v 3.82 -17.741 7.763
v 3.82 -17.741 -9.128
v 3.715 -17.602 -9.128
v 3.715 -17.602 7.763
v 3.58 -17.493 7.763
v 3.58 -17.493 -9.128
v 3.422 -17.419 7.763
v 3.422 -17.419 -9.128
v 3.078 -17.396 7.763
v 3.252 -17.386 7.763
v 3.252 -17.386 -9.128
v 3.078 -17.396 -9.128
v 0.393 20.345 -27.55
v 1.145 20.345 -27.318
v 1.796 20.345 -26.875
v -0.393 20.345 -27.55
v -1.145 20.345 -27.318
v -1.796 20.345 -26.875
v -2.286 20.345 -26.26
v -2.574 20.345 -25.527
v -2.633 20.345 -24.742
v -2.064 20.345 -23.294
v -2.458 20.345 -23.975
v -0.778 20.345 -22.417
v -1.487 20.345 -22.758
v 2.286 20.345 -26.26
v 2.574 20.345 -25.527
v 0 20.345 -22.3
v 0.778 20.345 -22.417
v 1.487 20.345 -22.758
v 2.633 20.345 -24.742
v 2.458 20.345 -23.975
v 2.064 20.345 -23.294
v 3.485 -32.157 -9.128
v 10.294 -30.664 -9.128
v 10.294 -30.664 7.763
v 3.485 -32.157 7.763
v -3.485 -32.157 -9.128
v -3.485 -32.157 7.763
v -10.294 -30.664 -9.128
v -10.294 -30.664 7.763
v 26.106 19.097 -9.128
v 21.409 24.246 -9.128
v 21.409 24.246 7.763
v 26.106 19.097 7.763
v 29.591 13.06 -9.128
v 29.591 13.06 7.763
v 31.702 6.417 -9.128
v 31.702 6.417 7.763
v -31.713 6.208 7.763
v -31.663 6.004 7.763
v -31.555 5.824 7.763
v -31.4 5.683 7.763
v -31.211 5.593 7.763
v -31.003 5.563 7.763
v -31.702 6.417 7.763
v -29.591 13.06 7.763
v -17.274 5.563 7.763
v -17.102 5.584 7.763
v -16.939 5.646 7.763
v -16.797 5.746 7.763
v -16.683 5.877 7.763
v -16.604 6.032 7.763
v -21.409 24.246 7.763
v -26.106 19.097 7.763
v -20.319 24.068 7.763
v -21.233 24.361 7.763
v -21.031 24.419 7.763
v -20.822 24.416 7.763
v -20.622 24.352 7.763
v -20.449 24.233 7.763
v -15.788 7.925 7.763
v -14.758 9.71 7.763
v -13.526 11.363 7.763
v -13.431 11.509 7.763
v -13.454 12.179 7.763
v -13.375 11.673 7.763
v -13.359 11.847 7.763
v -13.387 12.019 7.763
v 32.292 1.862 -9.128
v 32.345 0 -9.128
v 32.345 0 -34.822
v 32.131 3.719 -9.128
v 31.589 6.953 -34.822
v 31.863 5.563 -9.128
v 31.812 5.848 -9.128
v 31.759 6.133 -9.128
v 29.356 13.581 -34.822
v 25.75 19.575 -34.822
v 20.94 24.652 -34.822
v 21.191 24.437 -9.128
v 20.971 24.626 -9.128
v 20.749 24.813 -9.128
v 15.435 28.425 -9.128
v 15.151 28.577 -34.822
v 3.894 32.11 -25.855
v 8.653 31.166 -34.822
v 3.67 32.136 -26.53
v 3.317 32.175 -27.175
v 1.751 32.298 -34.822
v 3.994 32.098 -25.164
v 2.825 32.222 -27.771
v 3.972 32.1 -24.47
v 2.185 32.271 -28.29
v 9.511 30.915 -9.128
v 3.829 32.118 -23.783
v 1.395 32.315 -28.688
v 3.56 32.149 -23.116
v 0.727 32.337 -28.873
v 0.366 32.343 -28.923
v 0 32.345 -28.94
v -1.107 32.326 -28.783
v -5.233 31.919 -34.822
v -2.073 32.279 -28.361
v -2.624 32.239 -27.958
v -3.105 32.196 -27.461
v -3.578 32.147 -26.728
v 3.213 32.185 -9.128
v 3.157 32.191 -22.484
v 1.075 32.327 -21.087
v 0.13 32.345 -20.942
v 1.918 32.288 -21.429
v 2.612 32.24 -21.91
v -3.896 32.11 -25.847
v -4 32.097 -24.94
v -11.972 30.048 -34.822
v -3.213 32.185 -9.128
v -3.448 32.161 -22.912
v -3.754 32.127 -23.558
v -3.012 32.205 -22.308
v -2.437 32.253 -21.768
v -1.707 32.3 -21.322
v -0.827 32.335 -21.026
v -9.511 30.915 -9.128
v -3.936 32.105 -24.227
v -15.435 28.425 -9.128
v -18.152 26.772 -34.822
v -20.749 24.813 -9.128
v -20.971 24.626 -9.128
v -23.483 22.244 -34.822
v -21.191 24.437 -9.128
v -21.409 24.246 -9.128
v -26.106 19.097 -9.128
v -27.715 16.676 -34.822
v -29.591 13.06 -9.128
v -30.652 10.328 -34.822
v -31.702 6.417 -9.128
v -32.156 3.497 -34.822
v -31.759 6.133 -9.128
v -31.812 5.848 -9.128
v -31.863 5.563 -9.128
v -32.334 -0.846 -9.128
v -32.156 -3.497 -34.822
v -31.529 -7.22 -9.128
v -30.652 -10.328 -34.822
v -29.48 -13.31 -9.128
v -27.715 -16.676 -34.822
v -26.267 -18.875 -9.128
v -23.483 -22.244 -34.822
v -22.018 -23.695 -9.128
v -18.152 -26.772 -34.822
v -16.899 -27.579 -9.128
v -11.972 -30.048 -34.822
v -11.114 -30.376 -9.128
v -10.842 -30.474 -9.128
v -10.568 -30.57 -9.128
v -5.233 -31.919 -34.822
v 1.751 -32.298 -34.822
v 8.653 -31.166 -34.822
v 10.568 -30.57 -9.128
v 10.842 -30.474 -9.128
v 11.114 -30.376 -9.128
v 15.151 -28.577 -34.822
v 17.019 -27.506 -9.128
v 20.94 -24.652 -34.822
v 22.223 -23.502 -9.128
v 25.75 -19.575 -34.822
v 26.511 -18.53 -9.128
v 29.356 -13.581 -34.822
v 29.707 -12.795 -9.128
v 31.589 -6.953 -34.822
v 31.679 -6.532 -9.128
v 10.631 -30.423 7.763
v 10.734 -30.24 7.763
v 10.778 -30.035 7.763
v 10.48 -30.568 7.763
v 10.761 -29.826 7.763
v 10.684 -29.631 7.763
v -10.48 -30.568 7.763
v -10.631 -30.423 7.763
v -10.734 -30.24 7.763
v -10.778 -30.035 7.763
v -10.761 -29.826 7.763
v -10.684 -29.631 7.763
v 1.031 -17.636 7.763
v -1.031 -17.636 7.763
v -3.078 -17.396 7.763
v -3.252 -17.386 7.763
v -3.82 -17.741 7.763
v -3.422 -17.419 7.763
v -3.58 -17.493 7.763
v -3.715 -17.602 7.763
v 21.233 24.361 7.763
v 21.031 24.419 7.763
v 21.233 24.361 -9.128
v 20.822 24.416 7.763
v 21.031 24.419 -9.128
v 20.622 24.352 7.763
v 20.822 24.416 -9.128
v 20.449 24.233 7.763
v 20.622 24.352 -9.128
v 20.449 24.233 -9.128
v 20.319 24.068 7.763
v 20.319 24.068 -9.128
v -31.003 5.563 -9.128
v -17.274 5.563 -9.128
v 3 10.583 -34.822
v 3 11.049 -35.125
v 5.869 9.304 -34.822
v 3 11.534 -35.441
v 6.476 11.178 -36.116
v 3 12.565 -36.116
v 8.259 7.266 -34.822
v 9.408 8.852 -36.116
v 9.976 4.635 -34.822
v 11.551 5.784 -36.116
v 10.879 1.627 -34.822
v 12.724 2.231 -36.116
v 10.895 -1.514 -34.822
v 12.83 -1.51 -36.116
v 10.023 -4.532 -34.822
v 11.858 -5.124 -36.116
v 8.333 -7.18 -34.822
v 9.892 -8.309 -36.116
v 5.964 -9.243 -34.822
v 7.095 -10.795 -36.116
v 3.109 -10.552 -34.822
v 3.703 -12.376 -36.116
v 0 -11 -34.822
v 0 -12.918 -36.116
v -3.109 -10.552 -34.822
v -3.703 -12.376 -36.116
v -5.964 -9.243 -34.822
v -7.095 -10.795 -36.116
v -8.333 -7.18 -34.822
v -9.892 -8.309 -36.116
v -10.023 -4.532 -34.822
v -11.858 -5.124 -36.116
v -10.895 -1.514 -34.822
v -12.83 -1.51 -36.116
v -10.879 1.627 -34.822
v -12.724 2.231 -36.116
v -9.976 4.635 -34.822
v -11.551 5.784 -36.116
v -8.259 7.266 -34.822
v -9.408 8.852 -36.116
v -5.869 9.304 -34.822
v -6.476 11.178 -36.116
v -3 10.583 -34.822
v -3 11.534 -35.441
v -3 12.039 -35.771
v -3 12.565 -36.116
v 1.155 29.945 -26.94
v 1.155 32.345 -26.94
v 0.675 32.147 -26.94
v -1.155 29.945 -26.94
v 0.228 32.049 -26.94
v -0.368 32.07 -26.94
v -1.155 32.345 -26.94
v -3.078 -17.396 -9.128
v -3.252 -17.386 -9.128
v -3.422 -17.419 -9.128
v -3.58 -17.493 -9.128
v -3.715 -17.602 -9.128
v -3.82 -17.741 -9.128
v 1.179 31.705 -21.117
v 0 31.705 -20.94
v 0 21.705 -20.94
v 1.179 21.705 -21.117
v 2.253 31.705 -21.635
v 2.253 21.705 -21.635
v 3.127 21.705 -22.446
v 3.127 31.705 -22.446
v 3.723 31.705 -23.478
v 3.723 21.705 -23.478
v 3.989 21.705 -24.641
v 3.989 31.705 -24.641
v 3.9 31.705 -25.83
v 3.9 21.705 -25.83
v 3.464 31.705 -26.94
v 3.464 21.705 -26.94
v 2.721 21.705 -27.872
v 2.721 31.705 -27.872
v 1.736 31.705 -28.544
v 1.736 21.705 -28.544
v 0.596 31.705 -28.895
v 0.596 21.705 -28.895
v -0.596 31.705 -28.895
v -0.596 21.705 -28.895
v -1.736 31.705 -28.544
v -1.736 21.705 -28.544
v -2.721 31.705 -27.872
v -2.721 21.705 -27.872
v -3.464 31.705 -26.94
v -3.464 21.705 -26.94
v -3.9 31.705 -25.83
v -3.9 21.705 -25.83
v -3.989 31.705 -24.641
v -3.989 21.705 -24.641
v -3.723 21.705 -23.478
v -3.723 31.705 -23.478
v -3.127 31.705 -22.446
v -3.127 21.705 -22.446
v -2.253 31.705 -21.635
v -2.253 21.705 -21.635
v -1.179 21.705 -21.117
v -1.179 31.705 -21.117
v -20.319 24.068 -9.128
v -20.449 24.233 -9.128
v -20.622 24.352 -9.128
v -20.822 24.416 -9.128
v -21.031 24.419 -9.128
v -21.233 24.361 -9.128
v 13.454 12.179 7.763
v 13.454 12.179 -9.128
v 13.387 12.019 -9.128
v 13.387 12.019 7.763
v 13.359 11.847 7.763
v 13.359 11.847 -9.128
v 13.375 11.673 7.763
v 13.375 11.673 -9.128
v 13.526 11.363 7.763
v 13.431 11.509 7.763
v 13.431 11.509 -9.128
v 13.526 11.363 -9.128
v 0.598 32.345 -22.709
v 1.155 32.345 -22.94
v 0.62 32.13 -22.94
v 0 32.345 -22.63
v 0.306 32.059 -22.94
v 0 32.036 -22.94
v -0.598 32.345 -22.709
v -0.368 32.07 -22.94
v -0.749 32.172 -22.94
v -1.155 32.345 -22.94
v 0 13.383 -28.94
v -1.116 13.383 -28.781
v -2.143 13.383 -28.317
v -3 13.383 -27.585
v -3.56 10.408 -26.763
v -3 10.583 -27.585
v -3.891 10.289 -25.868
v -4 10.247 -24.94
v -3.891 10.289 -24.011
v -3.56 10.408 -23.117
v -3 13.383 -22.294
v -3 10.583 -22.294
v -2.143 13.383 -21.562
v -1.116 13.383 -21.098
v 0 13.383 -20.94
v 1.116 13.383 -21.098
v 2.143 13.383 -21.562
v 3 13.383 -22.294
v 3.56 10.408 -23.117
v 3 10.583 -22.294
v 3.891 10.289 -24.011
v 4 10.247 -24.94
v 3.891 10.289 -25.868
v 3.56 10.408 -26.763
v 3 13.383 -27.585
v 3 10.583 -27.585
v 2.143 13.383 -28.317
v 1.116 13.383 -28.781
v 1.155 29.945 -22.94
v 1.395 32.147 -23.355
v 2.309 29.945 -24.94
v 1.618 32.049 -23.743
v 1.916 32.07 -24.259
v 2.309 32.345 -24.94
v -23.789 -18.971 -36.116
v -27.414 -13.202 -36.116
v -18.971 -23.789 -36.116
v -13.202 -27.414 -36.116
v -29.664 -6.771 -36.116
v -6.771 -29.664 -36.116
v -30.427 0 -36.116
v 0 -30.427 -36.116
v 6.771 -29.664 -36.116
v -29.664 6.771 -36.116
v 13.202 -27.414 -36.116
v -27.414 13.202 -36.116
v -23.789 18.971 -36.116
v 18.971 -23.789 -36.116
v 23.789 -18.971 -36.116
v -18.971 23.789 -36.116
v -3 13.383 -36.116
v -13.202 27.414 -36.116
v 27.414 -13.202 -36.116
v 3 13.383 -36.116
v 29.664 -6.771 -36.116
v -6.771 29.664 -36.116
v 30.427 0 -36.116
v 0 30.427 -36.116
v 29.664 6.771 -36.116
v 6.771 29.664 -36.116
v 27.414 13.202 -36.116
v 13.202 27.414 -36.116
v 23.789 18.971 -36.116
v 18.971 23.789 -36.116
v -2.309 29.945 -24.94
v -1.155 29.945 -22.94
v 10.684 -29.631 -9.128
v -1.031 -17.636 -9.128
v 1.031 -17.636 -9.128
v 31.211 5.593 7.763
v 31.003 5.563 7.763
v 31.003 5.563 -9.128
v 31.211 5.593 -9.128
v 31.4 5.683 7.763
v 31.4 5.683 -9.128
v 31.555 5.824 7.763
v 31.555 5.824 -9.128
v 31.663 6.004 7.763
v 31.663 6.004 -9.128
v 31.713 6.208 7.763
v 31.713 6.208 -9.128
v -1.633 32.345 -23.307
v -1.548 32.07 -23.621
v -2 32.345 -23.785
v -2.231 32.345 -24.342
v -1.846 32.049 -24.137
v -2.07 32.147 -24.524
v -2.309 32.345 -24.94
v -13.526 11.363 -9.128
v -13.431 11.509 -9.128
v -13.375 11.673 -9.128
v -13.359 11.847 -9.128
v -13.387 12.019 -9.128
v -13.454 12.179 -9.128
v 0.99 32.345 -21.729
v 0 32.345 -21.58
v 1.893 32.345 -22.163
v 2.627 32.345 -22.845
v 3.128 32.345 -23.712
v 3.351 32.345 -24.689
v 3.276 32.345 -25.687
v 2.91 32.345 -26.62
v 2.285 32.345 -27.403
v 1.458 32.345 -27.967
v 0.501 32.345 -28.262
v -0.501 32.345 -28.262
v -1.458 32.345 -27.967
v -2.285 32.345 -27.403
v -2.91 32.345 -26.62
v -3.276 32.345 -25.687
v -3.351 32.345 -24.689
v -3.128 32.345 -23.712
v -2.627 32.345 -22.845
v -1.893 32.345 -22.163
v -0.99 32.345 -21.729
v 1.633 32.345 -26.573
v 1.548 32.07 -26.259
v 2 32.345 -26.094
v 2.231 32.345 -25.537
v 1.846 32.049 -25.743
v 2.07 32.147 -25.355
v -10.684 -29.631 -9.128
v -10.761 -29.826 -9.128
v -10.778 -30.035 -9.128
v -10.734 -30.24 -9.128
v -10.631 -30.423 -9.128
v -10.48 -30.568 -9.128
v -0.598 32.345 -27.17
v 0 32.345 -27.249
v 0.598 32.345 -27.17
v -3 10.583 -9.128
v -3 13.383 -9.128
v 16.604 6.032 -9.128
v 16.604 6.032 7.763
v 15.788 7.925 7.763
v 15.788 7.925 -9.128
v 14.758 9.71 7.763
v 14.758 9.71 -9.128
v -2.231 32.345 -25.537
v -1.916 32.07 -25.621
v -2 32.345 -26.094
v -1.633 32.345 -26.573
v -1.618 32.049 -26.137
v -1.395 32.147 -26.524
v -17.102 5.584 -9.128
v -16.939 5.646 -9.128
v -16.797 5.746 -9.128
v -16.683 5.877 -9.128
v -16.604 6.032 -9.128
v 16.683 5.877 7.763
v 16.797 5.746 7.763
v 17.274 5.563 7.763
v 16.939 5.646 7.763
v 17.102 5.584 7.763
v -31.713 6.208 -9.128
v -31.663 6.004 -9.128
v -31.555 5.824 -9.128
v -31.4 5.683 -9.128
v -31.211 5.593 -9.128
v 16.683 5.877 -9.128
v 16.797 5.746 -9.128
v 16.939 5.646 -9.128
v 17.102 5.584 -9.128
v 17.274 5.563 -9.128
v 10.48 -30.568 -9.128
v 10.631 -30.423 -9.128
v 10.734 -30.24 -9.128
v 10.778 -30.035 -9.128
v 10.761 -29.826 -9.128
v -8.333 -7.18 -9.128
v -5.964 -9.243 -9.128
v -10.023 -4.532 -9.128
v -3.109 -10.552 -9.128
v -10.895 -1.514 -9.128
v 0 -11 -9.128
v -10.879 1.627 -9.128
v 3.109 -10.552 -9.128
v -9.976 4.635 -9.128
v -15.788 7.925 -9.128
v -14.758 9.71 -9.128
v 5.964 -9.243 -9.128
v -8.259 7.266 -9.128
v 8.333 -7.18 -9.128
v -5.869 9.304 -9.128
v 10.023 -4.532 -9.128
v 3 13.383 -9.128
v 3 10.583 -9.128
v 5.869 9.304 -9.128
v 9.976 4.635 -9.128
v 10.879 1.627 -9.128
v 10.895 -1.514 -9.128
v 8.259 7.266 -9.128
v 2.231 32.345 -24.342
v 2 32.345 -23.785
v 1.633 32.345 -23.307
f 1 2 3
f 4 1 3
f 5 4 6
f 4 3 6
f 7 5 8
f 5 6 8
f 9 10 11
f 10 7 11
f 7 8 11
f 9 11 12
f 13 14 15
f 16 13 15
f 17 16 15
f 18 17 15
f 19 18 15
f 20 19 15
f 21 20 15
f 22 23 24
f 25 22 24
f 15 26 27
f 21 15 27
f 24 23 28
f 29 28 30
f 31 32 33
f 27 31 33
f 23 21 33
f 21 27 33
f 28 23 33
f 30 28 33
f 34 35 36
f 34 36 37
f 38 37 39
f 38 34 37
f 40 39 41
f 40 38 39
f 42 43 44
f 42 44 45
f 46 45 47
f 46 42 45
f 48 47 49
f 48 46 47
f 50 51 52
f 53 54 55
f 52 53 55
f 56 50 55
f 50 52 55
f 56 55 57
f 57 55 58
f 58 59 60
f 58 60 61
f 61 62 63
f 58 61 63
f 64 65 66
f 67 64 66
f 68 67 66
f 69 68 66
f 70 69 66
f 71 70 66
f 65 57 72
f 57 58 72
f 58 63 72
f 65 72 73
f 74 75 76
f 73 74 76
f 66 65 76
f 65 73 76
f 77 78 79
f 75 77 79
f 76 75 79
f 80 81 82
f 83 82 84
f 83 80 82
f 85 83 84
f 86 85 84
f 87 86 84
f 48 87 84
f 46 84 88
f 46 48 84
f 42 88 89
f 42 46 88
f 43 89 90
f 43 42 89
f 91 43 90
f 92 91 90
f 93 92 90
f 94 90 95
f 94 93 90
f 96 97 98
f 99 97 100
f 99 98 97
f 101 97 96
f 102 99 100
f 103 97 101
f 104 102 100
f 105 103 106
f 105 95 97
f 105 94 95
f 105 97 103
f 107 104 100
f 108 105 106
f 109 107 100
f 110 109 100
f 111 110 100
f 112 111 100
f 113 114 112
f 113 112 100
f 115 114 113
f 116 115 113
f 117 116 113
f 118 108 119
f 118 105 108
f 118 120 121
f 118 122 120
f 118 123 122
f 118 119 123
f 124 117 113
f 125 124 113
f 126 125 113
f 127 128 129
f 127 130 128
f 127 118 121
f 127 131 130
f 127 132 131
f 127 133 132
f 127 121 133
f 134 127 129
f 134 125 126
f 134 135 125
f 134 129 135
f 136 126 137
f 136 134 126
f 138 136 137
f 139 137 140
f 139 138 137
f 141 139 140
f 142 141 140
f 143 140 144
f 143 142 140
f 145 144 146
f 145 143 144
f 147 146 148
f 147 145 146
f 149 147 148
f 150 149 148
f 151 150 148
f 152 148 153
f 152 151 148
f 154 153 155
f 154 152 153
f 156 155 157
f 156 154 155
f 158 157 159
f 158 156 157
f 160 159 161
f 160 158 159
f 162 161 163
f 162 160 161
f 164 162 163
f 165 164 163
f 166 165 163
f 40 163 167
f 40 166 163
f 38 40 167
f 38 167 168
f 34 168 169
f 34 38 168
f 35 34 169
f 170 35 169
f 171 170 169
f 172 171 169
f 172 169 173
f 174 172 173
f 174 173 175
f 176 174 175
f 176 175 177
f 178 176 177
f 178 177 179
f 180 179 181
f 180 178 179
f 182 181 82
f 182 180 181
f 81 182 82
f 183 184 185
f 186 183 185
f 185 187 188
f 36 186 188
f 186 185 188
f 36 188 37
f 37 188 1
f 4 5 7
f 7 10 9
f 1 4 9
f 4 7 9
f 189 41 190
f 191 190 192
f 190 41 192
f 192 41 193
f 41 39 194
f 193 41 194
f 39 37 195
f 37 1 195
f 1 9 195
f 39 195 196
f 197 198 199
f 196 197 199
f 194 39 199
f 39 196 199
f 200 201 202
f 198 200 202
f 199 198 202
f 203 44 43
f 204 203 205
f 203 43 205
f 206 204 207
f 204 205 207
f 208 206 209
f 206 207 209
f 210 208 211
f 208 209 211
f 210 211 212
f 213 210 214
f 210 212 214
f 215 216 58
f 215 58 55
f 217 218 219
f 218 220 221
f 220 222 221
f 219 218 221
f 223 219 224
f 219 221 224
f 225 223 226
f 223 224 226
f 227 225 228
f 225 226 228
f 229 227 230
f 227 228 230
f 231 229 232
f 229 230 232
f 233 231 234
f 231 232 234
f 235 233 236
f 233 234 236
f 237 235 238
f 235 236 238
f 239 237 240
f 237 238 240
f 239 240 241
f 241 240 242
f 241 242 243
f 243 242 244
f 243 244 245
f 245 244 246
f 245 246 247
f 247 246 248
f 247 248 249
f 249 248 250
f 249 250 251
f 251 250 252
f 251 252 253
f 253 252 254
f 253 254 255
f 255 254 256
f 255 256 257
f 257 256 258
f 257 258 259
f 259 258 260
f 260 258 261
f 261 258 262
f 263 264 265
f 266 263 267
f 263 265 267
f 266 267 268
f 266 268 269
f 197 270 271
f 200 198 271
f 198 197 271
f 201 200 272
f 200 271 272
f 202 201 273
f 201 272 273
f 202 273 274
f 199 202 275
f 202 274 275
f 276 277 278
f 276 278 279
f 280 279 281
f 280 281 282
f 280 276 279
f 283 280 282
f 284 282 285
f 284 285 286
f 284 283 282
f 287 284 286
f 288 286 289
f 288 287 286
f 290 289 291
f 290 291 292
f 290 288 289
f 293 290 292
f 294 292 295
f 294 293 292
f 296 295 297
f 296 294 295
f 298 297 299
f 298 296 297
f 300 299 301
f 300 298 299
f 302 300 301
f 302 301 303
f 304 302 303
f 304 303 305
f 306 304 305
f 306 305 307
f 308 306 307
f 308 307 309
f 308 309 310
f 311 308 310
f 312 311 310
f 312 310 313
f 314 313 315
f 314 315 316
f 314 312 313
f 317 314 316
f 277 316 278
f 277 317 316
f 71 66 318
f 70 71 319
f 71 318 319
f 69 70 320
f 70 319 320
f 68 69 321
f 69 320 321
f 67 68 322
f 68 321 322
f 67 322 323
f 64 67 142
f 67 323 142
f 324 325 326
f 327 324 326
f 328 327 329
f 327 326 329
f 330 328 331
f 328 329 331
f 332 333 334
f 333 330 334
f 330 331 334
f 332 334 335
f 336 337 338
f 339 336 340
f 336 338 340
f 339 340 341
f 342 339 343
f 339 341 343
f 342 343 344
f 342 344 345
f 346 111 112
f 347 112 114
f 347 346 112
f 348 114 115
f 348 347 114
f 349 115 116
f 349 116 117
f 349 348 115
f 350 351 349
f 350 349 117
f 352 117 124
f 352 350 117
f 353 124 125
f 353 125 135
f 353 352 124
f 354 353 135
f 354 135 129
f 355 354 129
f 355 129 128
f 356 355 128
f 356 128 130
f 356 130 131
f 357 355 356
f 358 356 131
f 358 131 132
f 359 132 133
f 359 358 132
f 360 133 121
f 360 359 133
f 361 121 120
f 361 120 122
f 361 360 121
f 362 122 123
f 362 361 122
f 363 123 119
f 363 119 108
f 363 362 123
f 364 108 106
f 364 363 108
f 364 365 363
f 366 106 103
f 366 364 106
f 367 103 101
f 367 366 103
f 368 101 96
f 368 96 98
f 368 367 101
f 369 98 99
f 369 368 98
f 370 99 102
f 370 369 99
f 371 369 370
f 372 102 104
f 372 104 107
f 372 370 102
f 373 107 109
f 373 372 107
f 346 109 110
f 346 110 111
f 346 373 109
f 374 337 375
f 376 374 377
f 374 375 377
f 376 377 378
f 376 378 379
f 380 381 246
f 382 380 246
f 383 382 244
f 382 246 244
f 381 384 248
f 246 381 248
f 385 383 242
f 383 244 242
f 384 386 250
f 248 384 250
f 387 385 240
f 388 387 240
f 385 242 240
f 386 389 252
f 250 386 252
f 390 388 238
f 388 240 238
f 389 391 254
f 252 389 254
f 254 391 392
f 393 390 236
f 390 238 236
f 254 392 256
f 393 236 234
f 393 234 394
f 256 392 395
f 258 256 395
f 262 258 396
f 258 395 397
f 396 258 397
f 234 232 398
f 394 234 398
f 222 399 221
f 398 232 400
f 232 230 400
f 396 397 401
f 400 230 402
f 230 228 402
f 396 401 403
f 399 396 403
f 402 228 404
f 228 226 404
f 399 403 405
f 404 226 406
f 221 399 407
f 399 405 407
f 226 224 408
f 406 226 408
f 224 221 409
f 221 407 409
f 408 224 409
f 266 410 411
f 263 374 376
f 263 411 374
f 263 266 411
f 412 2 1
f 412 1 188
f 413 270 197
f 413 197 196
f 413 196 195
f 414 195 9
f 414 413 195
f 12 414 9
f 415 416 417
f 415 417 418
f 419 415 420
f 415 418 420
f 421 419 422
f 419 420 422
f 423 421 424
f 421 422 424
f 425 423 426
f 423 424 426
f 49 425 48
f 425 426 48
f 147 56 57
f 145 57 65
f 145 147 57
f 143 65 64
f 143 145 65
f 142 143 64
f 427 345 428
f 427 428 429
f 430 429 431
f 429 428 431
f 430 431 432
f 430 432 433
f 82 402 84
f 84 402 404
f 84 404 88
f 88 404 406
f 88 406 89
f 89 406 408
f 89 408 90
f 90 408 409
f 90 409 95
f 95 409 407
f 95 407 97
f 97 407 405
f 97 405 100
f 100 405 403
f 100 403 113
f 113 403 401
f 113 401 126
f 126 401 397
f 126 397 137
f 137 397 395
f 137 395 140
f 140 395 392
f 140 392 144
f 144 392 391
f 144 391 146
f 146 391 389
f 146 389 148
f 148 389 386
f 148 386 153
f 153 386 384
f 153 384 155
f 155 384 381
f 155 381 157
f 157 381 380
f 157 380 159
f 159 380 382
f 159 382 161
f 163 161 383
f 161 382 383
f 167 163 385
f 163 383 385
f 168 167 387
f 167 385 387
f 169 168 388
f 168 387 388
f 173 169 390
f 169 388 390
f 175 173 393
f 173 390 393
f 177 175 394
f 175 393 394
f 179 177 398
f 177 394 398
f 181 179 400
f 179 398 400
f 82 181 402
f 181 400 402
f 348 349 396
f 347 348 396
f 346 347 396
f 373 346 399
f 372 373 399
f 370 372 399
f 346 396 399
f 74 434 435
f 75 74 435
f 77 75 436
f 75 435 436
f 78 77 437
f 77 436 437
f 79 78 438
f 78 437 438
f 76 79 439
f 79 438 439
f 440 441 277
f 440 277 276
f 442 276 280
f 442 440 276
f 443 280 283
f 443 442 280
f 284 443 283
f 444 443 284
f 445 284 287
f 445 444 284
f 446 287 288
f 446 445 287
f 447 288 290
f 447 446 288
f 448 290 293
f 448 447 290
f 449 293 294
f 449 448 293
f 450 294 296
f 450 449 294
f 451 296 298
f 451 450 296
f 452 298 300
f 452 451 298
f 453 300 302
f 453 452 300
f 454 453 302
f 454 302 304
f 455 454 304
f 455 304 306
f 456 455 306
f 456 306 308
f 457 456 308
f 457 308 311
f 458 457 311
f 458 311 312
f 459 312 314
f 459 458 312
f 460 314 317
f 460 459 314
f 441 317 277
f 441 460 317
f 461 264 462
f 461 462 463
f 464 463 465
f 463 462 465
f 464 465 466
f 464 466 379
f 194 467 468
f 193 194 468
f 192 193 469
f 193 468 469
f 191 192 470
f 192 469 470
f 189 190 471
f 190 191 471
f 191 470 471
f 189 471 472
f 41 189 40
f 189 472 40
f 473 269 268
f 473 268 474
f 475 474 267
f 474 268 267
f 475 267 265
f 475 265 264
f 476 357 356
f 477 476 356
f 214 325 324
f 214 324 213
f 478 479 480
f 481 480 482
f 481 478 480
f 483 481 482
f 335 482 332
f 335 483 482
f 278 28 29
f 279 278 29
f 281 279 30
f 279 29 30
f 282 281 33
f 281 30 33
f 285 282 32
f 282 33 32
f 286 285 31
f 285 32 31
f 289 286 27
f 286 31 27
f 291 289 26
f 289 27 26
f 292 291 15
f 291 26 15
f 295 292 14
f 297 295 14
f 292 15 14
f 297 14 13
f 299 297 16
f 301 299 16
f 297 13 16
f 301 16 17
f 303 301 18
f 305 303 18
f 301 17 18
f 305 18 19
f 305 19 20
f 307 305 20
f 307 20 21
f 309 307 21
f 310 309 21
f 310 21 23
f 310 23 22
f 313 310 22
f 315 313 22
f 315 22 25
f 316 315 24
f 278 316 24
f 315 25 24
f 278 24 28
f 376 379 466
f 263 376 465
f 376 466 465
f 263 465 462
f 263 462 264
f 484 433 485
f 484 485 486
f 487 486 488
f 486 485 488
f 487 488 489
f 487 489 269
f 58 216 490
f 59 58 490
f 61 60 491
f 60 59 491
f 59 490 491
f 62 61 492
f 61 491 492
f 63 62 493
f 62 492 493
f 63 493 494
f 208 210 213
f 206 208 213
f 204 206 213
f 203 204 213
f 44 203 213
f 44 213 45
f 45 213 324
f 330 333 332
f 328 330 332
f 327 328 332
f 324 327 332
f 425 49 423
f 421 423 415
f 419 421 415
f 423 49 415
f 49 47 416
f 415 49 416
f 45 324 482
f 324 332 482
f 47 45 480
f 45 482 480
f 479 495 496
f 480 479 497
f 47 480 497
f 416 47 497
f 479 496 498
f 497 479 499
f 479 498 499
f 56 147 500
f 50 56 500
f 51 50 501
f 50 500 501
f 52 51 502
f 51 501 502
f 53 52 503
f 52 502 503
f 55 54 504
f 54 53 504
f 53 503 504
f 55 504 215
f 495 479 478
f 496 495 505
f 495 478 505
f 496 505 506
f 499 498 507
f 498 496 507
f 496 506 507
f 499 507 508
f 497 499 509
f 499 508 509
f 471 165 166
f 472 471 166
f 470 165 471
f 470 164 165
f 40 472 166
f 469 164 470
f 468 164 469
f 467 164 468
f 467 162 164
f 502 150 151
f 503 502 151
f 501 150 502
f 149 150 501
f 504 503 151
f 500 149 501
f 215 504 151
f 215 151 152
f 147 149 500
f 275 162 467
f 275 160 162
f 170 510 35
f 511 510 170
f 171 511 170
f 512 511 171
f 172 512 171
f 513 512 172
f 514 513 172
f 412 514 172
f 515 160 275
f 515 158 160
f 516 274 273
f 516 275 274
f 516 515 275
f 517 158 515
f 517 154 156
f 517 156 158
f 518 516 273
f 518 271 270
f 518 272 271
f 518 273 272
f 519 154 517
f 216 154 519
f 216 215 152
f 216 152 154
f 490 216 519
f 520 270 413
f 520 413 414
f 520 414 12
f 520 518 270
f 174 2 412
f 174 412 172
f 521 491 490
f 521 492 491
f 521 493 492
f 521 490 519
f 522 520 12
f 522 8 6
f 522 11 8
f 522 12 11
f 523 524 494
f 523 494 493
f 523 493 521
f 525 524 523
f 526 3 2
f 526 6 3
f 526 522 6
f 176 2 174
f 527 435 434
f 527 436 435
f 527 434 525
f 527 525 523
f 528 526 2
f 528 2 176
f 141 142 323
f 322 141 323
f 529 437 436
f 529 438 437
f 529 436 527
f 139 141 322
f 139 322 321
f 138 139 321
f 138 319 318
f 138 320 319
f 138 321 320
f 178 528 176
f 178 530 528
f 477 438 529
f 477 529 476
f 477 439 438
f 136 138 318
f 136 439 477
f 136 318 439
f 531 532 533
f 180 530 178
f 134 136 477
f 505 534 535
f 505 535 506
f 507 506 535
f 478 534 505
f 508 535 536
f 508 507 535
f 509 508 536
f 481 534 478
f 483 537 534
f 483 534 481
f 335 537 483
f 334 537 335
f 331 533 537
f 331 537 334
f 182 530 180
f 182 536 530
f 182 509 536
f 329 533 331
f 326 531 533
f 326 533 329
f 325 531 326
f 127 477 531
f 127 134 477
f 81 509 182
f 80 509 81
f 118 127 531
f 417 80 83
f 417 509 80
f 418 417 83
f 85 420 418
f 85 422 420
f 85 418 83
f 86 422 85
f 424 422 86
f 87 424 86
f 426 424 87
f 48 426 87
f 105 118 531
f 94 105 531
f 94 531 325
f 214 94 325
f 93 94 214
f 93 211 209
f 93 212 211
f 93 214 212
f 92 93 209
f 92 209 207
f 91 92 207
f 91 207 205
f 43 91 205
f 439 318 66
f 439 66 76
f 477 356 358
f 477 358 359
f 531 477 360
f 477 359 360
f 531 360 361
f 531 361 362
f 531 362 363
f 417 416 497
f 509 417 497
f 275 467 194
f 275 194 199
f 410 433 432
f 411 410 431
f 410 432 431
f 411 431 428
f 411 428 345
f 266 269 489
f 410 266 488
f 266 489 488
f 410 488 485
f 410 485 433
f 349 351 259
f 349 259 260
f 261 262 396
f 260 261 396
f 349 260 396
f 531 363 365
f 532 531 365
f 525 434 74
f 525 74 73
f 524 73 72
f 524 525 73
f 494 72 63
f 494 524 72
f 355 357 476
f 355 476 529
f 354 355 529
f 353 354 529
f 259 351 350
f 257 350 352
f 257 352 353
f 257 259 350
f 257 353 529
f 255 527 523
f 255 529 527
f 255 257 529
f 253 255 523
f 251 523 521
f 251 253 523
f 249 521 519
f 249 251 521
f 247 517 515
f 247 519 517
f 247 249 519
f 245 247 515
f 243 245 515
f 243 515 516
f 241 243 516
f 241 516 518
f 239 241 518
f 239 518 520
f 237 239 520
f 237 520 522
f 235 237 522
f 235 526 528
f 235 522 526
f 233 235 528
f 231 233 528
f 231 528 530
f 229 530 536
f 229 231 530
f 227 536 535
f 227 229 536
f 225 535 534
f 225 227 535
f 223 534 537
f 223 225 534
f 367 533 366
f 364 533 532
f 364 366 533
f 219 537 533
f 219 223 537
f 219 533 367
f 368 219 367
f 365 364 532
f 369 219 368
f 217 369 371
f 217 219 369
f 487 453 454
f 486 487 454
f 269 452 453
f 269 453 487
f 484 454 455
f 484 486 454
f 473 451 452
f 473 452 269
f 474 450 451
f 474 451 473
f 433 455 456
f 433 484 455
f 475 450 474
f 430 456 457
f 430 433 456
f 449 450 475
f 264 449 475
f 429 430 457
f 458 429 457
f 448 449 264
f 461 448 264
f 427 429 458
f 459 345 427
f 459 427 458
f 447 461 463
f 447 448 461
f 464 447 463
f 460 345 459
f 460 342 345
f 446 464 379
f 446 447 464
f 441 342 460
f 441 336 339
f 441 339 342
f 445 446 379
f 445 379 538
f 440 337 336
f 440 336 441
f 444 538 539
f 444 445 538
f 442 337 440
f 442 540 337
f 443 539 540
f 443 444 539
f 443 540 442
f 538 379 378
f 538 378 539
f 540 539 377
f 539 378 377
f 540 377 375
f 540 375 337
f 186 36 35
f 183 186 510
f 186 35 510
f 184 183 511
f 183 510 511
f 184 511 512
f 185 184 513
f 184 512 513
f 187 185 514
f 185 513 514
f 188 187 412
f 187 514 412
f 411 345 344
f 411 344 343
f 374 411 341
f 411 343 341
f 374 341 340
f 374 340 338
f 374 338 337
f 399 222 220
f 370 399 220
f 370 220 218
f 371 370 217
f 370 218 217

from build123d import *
from OCP.BRepFilletAPI import BRepFilletAPI_MakeChamfer

# Parameters (mm, degrees)
BOSS_EXTRUDE1_START      = -9.128125
SKETCH1_R                = 32.3453125
BOSS_EXTRUDE1_DEPTH      = 26.9875
BOSS_EXTRUDE2_DEPTH      = 16.891
FILLET1_R                = 0.713235825
CIRPATTERN1_COUNT        = 3
FILLET1_OF_CIRPATTERN1_R = 0.713235825
CUT_EXTRUDE5_DEPTH       = 59.281874117
CUT_EXTRUDE5_DEPTH_BACK  = 59.281874117
SKETCH15_R               = 11
CHAMFER1_SIZE            = 1.2938125
CHAMFER1_SIZE2           = 1.918155913
CUT_EXTRUDE1_DEPTH       = 59.281874117
CUT_EXTRUDE1_DEPTH_BACK  = 59.281874117
SKETCH5_R                = 4
CUT_EXTRUDE2_DEPTH       = 59.281874117
SKETCH6_R                = 4
BOSS_EXTRUDE3_DEPTH      = 12
CUT_EXTRUDE3_DEPTH       = 2.4
CHAMFER3_SIZE            = 0.64
CHAMFER4_SIZE            = 1.36


with BuildPart() as part:
    # Sketch1 → Boss-Extrude1 (new body)
    with BuildSketch(Plane.XY.offset(BOSS_EXTRUDE1_START)):
        Circle(SKETCH1_R)
    extrude(amount=-BOSS_EXTRUDE1_DEPTH)

    # Sketch2 → Boss-Extrude2 (add)
    with BuildSketch(Plane.XY.offset(-9.128125)):
        with BuildLine():
            Line((-11.114350717, -30.375820135), (-3.566179127, -17.302003437))
            ThreePointArc((-3.566179127, -17.302003437), (0, -17.6657), (3.566179127, -17.302003437))
            Line((3.566179127, -17.302003437), (11.114350717, -30.375820135))
            ThreePointArc((11.114350717, -30.375820135), (0, -32.3453125), (-11.114350717, -30.375820135))
        make_face()
    boss_extrude2 = extrude(amount=BOSS_EXTRUDE2_DEPTH)

    # Fillet1
    # the kernel refuses this fillet: 0.713235825 mm, written as the material it takes off along each edge
    with BuildSketch(Plane(origin=(-11.114350717, -30.375820135, -9.128125), x_dir=(0.9436455754007305, -0.3309577435664929, 0), z_dir=(0, 0, 1))) as fillet1_piece_1:
        with BuildLine():
            CenterArc((0.860200247, 0.713171354), FILLET1_R, 169.326916929, 101.443469756)
            Line((0.159303464, 0.845266176), (0, 0))
            ThreePointArc((0, 0), (0.434894987, -0.002923796), (0.869789973, 0))
        make_face()
    extrude(amount=19.065474933, mode=Mode.SUBTRACT)
    with BuildSketch(Plane(origin=(11.114350717, -30.375820135, -9.128125), x_dir=(-0.9436455754007282, -0.3309577435664989, 0), z_dir=(0, 0, 1))) as fillet1_piece_2:
        with BuildLine():
            CenterArc((0.860200247, -0.713171354), FILLET1_R, 89.229613314, 101.443469756)
            Line((0.159303464, -0.845266176), (0, 0))
            ThreePointArc((0, 0), (0.434894987, 0.002923796), (0.869789973, 0))
        make_face()
    extrude(amount=19.065474933, mode=Mode.SUBTRACT)
    with BuildSketch(Plane(origin=(3.566179127, -17.302003437, -9.128125), x_dir=(0.500000000000002, -0.8660254037844376, 0), z_dir=(0, 0, 1))) as fillet1_piece_3:
        with BuildLine():
            CenterArc((0.507170112, -0.713235825), FILLET1_R, 90, 70.033604576)
            ThreePointArc((-0.163195289, -0.469687941), (-0.07994504, -0.235418176), (0, 0))
            Line((0, 0), (0.507170112, 0))
        make_face()
    extrude(amount=18.158925279, mode=Mode.SUBTRACT)
    with BuildSketch(Plane(origin=(-3.566179127, -17.302003437, -9.128125), x_dir=(0.9821562739684868, -0.18806661985673784, 0), z_dir=(0, 0, 1))) as fillet1_piece_4:
        with BuildLine():
            CenterArc((0.507269431, -0.71316519), FILLET1_R, 90.806371221, 70.033604577)
            Line((-0.166457119, -0.479075724), (0, 0))
            ThreePointArc((0, 0), (0.248615901, -0.001749518), (0.497231801, 0))
        make_face()
    extrude(amount=18.158925279, mode=Mode.SUBTRACT)

    # CirPattern1: Boss-Extrude2 ×3 about axis
    cirpattern1_axis = Axis((0, 0, 0), (0, 0, 1))
    for i in range(1, CIRPATTERN1_COUNT):
        add(boss_extrude2.rotate(cirpattern1_axis, i * 360 / CIRPATTERN1_COUNT))

    # Fillet1 of CirPattern1
    # the kernel refuses this fillet: 0.713235825 mm, written as the material it takes off along each edge
    with BuildSketch(Plane(origin=(31.863407256, 5.5626, -9.128125), x_dir=(-0.18520497419260348, 0.9826999122490635, 0), z_dir=(0, 0, 1)), Plane(origin=(-20.749056539, 24.813220135, -9.128125), x_dir=(-0.7584406012081224, -0.6517421686825718, 0), z_dir=(0, 0, 1))) as fillet1_of_cirpattern1_piece_1:
        with BuildLine():
            CenterArc((0.860200247, 0.713171354), FILLET1_OF_CIRPATTERN1_R, 169.326916929, 101.443469756)
            Line((0.159303464, 0.845266176), (0, 0))
            ThreePointArc((0, 0), (0.434894987, -0.002923796), (0.869789973, 0))
        make_face()
    extrude(amount=19.065474933, mode=Mode.SUBTRACT)
    with BuildSketch(Plane(origin=(20.749056539, 24.813220135, -9.128125), x_dir=(0.7584406012081266, -0.6517421686825667, 0), z_dir=(0, 0, 1)), Plane(origin=(-31.863407256, 5.5626, -9.128125), x_dir=(0.18520497419260348, 0.9826999122490635, 0), z_dir=(0, 0, 1))) as fillet1_of_cirpattern1_piece_2:
        with BuildLine():
            CenterArc((0.860200247, -0.713171354), FILLET1_OF_CIRPATTERN1_R, 89.229613314, 101.443469756)
            Line((0.159303464, -0.845266176), (0, 0))
            ThreePointArc((0, 0), (0.434894987, 0.002923796), (0.869789973, 0))
        make_face()
    extrude(amount=19.065474933, mode=Mode.SUBTRACT)
    with BuildSketch(Plane(origin=(13.200884949, 11.739403437, -9.128125), x_dir=(0.49999999999999967, 0.8660254037844388, 0), z_dir=(0, 0, 1)), Plane(origin=(-16.767064076, 5.5626, -9.128125), x_dir=(-1, 0, 0), z_dir=(0, 0, 1))) as fillet1_of_cirpattern1_piece_3:
        with BuildLine():
            CenterArc((0.507170112, -0.713235825), FILLET1_OF_CIRPATTERN1_R, 90, 70.033604576)
            ThreePointArc((-0.163195289, -0.469687941), (-0.07994504, -0.235418176), (0, 0))
            Line((0, 0), (0.507170112, 0))
        make_face()
    extrude(amount=18.158925279, mode=Mode.SUBTRACT)
    with BuildSketch(Plane(origin=(16.767064076, 5.5626, -9.128125), x_dir=(-0.3282076665844337, 0.9446055936713488, 0), z_dir=(0, 0, 1)), Plane(origin=(-13.200884949, 11.739403437, -9.128125), x_dir=(-0.6539486073840537, -0.7565389738146059, 0), z_dir=(0, 0, 1))) as fillet1_of_cirpattern1_piece_4:
        with BuildLine():
            CenterArc((0.507269431, -0.71316519), FILLET1_OF_CIRPATTERN1_R, 90.806371221, 70.033604577)
            Line((-0.166457119, -0.479075724), (0, 0))
            ThreePointArc((0, 0), (0.248615901, -0.001749518), (0.497231801, 0))
        make_face()
    extrude(amount=18.158925279, mode=Mode.SUBTRACT)

    # Sketch15 → Cut-Extrude5 (cut, two sides: drawn at the far end of the back side and taken through both)
    with BuildSketch(Plane.XY.offset(-CUT_EXTRUDE5_DEPTH_BACK)):
        Circle(SKETCH15_R)
    extrude(amount=CUT_EXTRUDE5_DEPTH + CUT_EXTRUDE5_DEPTH_BACK, mode=Mode.SUBTRACT)

    # Chamfer1: one chamfer whose edges measure the first distance from different faces: ONE call of the kernel's chamfer builder (chamfer() names one face for all edges)
    chamfer1_edges_1 = [part.edges().sort_by_distance(p)[0] for p in [
        (-32.3453125, 0, -36.115625),
    ]]
    chamfer1_side_1 = [part.faces().sort_by_distance(p)[0] for p in [
        (-32.3453125, 0, -22.621875),
    ]]
    chamfer1_edges_2 = [part.edges().sort_by_distance(p)[0] for p in [
        (-11, 0, -36.115625),
    ]]
    chamfer1_side_2 = [part.faces().sort_by_distance(p)[0] for p in [
        (-11, 0, -22.621875),
    ]]
    chamfer1 = BRepFilletAPI_MakeChamfer(part.part.solid().wrapped)
    for e in chamfer1_edges_1:
        chamfer1.Add(CHAMFER1_SIZE, CHAMFER1_SIZE2, e.wrapped, chamfer1_side_1[0].wrapped)  # the first distance lies on this face
    for e in chamfer1_edges_2:
        chamfer1.Add(CHAMFER1_SIZE, CHAMFER1_SIZE2, e.wrapped, chamfer1_side_2[0].wrapped)  # the first distance lies on this face
    add(Compound.cast(chamfer1.Shape()), mode=Mode.REPLACE)

    # Sketch4 → Cut-Extrude1 (cut, two sides: drawn at the far end of the back side and taken through both)
    with BuildSketch(Plane.XY.offset(-CUT_EXTRUDE1_DEPTH_BACK)):
        with BuildLine():
            Line((-3, 13.383005244), (3, 13.383005244))
            Line((3, 13.383005244), (3, 10.583005244))
            ThreePointArc((3, 10.583005244), (0, 11), (-3, 10.583005244))
            Line((-3, 10.583005244), (-3, 13.383005244))
        make_face()
    extrude(amount=CUT_EXTRUDE1_DEPTH + CUT_EXTRUDE1_DEPTH_BACK, mode=Mode.SUBTRACT)

    # Sketch5 → Cut-Extrude2 (cut, through all)
    with BuildSketch(Plane(origin=(0, 0, 0), x_dir=(1, 0, 0), z_dir=(0, 1, 0))):
        with Locations(Location((0, 24.939625, 0), (0, 0, 90))):
            Circle(SKETCH5_R)
    extrude(amount=CUT_EXTRUDE2_DEPTH, mode=Mode.SUBTRACT)


with BuildPart() as body_2:
    # Sketch6 → Boss-Extrude3 (new body)
    with BuildSketch(Plane(origin=(0, 32.3453125, 0), x_dir=(-1, 0, 0), z_dir=(0, 1, 0))):
        with Locations(Location((0, -24.939625, 0), (0, 0, 90))):
            Circle(SKETCH6_R)
    extrude(amount=-BOSS_EXTRUDE3_DEPTH)

    # Sketch8 → Cut-Extrude3 (cut)
    with BuildSketch(Plane(origin=(0, 32.3453125, 0), x_dir=(1, 0, 0), z_dir=(0, 1, 0))):
        Polygon((1.154700538, 22.939625), (2.309401077, 24.939625), (1.154700538, 26.939625), (-1.154700538, 26.939625), (-2.309401077, 24.939625), (-1.154700538, 22.939625), align=None)
    extrude(amount=-CUT_EXTRUDE3_DEPTH, mode=Mode.SUBTRACT)

    # Cut-Extrude4 cone 1 section (through the dimple's axis) → Cut-Extrude4 (revolve, cut)
    with BuildSketch(Plane(origin=(0, 32.3453125, -24.939625), x_dir=(0, 0, 1), z_dir=(1, 0, 0))):
        Polygon((0, 0), (2.309401077, 0), (0, 2.309401077), align=None)
    revolve(axis=Axis((0, 32.3453125, -24.939625), (0, -1, 0)), mode=Mode.SUBTRACT)

    # Chamfer3
    chamfer3_edges = [body_2.edges().sort_by_distance(p)[0] for p in [
        (0, 32.3453125, -28.939625),
    ]]
    chamfer(chamfer3_edges, length=CHAMFER3_SIZE)

    # Chamfer4
    chamfer4_edges = [body_2.edges().sort_by_distance(p)[0] for p in [
        (0, 20.3453125, -28.939625),
    ]]
    chamfer(chamfer4_edges, length=CHAMFER4_SIZE)


solid = Compound([part.part, body_2.part])
